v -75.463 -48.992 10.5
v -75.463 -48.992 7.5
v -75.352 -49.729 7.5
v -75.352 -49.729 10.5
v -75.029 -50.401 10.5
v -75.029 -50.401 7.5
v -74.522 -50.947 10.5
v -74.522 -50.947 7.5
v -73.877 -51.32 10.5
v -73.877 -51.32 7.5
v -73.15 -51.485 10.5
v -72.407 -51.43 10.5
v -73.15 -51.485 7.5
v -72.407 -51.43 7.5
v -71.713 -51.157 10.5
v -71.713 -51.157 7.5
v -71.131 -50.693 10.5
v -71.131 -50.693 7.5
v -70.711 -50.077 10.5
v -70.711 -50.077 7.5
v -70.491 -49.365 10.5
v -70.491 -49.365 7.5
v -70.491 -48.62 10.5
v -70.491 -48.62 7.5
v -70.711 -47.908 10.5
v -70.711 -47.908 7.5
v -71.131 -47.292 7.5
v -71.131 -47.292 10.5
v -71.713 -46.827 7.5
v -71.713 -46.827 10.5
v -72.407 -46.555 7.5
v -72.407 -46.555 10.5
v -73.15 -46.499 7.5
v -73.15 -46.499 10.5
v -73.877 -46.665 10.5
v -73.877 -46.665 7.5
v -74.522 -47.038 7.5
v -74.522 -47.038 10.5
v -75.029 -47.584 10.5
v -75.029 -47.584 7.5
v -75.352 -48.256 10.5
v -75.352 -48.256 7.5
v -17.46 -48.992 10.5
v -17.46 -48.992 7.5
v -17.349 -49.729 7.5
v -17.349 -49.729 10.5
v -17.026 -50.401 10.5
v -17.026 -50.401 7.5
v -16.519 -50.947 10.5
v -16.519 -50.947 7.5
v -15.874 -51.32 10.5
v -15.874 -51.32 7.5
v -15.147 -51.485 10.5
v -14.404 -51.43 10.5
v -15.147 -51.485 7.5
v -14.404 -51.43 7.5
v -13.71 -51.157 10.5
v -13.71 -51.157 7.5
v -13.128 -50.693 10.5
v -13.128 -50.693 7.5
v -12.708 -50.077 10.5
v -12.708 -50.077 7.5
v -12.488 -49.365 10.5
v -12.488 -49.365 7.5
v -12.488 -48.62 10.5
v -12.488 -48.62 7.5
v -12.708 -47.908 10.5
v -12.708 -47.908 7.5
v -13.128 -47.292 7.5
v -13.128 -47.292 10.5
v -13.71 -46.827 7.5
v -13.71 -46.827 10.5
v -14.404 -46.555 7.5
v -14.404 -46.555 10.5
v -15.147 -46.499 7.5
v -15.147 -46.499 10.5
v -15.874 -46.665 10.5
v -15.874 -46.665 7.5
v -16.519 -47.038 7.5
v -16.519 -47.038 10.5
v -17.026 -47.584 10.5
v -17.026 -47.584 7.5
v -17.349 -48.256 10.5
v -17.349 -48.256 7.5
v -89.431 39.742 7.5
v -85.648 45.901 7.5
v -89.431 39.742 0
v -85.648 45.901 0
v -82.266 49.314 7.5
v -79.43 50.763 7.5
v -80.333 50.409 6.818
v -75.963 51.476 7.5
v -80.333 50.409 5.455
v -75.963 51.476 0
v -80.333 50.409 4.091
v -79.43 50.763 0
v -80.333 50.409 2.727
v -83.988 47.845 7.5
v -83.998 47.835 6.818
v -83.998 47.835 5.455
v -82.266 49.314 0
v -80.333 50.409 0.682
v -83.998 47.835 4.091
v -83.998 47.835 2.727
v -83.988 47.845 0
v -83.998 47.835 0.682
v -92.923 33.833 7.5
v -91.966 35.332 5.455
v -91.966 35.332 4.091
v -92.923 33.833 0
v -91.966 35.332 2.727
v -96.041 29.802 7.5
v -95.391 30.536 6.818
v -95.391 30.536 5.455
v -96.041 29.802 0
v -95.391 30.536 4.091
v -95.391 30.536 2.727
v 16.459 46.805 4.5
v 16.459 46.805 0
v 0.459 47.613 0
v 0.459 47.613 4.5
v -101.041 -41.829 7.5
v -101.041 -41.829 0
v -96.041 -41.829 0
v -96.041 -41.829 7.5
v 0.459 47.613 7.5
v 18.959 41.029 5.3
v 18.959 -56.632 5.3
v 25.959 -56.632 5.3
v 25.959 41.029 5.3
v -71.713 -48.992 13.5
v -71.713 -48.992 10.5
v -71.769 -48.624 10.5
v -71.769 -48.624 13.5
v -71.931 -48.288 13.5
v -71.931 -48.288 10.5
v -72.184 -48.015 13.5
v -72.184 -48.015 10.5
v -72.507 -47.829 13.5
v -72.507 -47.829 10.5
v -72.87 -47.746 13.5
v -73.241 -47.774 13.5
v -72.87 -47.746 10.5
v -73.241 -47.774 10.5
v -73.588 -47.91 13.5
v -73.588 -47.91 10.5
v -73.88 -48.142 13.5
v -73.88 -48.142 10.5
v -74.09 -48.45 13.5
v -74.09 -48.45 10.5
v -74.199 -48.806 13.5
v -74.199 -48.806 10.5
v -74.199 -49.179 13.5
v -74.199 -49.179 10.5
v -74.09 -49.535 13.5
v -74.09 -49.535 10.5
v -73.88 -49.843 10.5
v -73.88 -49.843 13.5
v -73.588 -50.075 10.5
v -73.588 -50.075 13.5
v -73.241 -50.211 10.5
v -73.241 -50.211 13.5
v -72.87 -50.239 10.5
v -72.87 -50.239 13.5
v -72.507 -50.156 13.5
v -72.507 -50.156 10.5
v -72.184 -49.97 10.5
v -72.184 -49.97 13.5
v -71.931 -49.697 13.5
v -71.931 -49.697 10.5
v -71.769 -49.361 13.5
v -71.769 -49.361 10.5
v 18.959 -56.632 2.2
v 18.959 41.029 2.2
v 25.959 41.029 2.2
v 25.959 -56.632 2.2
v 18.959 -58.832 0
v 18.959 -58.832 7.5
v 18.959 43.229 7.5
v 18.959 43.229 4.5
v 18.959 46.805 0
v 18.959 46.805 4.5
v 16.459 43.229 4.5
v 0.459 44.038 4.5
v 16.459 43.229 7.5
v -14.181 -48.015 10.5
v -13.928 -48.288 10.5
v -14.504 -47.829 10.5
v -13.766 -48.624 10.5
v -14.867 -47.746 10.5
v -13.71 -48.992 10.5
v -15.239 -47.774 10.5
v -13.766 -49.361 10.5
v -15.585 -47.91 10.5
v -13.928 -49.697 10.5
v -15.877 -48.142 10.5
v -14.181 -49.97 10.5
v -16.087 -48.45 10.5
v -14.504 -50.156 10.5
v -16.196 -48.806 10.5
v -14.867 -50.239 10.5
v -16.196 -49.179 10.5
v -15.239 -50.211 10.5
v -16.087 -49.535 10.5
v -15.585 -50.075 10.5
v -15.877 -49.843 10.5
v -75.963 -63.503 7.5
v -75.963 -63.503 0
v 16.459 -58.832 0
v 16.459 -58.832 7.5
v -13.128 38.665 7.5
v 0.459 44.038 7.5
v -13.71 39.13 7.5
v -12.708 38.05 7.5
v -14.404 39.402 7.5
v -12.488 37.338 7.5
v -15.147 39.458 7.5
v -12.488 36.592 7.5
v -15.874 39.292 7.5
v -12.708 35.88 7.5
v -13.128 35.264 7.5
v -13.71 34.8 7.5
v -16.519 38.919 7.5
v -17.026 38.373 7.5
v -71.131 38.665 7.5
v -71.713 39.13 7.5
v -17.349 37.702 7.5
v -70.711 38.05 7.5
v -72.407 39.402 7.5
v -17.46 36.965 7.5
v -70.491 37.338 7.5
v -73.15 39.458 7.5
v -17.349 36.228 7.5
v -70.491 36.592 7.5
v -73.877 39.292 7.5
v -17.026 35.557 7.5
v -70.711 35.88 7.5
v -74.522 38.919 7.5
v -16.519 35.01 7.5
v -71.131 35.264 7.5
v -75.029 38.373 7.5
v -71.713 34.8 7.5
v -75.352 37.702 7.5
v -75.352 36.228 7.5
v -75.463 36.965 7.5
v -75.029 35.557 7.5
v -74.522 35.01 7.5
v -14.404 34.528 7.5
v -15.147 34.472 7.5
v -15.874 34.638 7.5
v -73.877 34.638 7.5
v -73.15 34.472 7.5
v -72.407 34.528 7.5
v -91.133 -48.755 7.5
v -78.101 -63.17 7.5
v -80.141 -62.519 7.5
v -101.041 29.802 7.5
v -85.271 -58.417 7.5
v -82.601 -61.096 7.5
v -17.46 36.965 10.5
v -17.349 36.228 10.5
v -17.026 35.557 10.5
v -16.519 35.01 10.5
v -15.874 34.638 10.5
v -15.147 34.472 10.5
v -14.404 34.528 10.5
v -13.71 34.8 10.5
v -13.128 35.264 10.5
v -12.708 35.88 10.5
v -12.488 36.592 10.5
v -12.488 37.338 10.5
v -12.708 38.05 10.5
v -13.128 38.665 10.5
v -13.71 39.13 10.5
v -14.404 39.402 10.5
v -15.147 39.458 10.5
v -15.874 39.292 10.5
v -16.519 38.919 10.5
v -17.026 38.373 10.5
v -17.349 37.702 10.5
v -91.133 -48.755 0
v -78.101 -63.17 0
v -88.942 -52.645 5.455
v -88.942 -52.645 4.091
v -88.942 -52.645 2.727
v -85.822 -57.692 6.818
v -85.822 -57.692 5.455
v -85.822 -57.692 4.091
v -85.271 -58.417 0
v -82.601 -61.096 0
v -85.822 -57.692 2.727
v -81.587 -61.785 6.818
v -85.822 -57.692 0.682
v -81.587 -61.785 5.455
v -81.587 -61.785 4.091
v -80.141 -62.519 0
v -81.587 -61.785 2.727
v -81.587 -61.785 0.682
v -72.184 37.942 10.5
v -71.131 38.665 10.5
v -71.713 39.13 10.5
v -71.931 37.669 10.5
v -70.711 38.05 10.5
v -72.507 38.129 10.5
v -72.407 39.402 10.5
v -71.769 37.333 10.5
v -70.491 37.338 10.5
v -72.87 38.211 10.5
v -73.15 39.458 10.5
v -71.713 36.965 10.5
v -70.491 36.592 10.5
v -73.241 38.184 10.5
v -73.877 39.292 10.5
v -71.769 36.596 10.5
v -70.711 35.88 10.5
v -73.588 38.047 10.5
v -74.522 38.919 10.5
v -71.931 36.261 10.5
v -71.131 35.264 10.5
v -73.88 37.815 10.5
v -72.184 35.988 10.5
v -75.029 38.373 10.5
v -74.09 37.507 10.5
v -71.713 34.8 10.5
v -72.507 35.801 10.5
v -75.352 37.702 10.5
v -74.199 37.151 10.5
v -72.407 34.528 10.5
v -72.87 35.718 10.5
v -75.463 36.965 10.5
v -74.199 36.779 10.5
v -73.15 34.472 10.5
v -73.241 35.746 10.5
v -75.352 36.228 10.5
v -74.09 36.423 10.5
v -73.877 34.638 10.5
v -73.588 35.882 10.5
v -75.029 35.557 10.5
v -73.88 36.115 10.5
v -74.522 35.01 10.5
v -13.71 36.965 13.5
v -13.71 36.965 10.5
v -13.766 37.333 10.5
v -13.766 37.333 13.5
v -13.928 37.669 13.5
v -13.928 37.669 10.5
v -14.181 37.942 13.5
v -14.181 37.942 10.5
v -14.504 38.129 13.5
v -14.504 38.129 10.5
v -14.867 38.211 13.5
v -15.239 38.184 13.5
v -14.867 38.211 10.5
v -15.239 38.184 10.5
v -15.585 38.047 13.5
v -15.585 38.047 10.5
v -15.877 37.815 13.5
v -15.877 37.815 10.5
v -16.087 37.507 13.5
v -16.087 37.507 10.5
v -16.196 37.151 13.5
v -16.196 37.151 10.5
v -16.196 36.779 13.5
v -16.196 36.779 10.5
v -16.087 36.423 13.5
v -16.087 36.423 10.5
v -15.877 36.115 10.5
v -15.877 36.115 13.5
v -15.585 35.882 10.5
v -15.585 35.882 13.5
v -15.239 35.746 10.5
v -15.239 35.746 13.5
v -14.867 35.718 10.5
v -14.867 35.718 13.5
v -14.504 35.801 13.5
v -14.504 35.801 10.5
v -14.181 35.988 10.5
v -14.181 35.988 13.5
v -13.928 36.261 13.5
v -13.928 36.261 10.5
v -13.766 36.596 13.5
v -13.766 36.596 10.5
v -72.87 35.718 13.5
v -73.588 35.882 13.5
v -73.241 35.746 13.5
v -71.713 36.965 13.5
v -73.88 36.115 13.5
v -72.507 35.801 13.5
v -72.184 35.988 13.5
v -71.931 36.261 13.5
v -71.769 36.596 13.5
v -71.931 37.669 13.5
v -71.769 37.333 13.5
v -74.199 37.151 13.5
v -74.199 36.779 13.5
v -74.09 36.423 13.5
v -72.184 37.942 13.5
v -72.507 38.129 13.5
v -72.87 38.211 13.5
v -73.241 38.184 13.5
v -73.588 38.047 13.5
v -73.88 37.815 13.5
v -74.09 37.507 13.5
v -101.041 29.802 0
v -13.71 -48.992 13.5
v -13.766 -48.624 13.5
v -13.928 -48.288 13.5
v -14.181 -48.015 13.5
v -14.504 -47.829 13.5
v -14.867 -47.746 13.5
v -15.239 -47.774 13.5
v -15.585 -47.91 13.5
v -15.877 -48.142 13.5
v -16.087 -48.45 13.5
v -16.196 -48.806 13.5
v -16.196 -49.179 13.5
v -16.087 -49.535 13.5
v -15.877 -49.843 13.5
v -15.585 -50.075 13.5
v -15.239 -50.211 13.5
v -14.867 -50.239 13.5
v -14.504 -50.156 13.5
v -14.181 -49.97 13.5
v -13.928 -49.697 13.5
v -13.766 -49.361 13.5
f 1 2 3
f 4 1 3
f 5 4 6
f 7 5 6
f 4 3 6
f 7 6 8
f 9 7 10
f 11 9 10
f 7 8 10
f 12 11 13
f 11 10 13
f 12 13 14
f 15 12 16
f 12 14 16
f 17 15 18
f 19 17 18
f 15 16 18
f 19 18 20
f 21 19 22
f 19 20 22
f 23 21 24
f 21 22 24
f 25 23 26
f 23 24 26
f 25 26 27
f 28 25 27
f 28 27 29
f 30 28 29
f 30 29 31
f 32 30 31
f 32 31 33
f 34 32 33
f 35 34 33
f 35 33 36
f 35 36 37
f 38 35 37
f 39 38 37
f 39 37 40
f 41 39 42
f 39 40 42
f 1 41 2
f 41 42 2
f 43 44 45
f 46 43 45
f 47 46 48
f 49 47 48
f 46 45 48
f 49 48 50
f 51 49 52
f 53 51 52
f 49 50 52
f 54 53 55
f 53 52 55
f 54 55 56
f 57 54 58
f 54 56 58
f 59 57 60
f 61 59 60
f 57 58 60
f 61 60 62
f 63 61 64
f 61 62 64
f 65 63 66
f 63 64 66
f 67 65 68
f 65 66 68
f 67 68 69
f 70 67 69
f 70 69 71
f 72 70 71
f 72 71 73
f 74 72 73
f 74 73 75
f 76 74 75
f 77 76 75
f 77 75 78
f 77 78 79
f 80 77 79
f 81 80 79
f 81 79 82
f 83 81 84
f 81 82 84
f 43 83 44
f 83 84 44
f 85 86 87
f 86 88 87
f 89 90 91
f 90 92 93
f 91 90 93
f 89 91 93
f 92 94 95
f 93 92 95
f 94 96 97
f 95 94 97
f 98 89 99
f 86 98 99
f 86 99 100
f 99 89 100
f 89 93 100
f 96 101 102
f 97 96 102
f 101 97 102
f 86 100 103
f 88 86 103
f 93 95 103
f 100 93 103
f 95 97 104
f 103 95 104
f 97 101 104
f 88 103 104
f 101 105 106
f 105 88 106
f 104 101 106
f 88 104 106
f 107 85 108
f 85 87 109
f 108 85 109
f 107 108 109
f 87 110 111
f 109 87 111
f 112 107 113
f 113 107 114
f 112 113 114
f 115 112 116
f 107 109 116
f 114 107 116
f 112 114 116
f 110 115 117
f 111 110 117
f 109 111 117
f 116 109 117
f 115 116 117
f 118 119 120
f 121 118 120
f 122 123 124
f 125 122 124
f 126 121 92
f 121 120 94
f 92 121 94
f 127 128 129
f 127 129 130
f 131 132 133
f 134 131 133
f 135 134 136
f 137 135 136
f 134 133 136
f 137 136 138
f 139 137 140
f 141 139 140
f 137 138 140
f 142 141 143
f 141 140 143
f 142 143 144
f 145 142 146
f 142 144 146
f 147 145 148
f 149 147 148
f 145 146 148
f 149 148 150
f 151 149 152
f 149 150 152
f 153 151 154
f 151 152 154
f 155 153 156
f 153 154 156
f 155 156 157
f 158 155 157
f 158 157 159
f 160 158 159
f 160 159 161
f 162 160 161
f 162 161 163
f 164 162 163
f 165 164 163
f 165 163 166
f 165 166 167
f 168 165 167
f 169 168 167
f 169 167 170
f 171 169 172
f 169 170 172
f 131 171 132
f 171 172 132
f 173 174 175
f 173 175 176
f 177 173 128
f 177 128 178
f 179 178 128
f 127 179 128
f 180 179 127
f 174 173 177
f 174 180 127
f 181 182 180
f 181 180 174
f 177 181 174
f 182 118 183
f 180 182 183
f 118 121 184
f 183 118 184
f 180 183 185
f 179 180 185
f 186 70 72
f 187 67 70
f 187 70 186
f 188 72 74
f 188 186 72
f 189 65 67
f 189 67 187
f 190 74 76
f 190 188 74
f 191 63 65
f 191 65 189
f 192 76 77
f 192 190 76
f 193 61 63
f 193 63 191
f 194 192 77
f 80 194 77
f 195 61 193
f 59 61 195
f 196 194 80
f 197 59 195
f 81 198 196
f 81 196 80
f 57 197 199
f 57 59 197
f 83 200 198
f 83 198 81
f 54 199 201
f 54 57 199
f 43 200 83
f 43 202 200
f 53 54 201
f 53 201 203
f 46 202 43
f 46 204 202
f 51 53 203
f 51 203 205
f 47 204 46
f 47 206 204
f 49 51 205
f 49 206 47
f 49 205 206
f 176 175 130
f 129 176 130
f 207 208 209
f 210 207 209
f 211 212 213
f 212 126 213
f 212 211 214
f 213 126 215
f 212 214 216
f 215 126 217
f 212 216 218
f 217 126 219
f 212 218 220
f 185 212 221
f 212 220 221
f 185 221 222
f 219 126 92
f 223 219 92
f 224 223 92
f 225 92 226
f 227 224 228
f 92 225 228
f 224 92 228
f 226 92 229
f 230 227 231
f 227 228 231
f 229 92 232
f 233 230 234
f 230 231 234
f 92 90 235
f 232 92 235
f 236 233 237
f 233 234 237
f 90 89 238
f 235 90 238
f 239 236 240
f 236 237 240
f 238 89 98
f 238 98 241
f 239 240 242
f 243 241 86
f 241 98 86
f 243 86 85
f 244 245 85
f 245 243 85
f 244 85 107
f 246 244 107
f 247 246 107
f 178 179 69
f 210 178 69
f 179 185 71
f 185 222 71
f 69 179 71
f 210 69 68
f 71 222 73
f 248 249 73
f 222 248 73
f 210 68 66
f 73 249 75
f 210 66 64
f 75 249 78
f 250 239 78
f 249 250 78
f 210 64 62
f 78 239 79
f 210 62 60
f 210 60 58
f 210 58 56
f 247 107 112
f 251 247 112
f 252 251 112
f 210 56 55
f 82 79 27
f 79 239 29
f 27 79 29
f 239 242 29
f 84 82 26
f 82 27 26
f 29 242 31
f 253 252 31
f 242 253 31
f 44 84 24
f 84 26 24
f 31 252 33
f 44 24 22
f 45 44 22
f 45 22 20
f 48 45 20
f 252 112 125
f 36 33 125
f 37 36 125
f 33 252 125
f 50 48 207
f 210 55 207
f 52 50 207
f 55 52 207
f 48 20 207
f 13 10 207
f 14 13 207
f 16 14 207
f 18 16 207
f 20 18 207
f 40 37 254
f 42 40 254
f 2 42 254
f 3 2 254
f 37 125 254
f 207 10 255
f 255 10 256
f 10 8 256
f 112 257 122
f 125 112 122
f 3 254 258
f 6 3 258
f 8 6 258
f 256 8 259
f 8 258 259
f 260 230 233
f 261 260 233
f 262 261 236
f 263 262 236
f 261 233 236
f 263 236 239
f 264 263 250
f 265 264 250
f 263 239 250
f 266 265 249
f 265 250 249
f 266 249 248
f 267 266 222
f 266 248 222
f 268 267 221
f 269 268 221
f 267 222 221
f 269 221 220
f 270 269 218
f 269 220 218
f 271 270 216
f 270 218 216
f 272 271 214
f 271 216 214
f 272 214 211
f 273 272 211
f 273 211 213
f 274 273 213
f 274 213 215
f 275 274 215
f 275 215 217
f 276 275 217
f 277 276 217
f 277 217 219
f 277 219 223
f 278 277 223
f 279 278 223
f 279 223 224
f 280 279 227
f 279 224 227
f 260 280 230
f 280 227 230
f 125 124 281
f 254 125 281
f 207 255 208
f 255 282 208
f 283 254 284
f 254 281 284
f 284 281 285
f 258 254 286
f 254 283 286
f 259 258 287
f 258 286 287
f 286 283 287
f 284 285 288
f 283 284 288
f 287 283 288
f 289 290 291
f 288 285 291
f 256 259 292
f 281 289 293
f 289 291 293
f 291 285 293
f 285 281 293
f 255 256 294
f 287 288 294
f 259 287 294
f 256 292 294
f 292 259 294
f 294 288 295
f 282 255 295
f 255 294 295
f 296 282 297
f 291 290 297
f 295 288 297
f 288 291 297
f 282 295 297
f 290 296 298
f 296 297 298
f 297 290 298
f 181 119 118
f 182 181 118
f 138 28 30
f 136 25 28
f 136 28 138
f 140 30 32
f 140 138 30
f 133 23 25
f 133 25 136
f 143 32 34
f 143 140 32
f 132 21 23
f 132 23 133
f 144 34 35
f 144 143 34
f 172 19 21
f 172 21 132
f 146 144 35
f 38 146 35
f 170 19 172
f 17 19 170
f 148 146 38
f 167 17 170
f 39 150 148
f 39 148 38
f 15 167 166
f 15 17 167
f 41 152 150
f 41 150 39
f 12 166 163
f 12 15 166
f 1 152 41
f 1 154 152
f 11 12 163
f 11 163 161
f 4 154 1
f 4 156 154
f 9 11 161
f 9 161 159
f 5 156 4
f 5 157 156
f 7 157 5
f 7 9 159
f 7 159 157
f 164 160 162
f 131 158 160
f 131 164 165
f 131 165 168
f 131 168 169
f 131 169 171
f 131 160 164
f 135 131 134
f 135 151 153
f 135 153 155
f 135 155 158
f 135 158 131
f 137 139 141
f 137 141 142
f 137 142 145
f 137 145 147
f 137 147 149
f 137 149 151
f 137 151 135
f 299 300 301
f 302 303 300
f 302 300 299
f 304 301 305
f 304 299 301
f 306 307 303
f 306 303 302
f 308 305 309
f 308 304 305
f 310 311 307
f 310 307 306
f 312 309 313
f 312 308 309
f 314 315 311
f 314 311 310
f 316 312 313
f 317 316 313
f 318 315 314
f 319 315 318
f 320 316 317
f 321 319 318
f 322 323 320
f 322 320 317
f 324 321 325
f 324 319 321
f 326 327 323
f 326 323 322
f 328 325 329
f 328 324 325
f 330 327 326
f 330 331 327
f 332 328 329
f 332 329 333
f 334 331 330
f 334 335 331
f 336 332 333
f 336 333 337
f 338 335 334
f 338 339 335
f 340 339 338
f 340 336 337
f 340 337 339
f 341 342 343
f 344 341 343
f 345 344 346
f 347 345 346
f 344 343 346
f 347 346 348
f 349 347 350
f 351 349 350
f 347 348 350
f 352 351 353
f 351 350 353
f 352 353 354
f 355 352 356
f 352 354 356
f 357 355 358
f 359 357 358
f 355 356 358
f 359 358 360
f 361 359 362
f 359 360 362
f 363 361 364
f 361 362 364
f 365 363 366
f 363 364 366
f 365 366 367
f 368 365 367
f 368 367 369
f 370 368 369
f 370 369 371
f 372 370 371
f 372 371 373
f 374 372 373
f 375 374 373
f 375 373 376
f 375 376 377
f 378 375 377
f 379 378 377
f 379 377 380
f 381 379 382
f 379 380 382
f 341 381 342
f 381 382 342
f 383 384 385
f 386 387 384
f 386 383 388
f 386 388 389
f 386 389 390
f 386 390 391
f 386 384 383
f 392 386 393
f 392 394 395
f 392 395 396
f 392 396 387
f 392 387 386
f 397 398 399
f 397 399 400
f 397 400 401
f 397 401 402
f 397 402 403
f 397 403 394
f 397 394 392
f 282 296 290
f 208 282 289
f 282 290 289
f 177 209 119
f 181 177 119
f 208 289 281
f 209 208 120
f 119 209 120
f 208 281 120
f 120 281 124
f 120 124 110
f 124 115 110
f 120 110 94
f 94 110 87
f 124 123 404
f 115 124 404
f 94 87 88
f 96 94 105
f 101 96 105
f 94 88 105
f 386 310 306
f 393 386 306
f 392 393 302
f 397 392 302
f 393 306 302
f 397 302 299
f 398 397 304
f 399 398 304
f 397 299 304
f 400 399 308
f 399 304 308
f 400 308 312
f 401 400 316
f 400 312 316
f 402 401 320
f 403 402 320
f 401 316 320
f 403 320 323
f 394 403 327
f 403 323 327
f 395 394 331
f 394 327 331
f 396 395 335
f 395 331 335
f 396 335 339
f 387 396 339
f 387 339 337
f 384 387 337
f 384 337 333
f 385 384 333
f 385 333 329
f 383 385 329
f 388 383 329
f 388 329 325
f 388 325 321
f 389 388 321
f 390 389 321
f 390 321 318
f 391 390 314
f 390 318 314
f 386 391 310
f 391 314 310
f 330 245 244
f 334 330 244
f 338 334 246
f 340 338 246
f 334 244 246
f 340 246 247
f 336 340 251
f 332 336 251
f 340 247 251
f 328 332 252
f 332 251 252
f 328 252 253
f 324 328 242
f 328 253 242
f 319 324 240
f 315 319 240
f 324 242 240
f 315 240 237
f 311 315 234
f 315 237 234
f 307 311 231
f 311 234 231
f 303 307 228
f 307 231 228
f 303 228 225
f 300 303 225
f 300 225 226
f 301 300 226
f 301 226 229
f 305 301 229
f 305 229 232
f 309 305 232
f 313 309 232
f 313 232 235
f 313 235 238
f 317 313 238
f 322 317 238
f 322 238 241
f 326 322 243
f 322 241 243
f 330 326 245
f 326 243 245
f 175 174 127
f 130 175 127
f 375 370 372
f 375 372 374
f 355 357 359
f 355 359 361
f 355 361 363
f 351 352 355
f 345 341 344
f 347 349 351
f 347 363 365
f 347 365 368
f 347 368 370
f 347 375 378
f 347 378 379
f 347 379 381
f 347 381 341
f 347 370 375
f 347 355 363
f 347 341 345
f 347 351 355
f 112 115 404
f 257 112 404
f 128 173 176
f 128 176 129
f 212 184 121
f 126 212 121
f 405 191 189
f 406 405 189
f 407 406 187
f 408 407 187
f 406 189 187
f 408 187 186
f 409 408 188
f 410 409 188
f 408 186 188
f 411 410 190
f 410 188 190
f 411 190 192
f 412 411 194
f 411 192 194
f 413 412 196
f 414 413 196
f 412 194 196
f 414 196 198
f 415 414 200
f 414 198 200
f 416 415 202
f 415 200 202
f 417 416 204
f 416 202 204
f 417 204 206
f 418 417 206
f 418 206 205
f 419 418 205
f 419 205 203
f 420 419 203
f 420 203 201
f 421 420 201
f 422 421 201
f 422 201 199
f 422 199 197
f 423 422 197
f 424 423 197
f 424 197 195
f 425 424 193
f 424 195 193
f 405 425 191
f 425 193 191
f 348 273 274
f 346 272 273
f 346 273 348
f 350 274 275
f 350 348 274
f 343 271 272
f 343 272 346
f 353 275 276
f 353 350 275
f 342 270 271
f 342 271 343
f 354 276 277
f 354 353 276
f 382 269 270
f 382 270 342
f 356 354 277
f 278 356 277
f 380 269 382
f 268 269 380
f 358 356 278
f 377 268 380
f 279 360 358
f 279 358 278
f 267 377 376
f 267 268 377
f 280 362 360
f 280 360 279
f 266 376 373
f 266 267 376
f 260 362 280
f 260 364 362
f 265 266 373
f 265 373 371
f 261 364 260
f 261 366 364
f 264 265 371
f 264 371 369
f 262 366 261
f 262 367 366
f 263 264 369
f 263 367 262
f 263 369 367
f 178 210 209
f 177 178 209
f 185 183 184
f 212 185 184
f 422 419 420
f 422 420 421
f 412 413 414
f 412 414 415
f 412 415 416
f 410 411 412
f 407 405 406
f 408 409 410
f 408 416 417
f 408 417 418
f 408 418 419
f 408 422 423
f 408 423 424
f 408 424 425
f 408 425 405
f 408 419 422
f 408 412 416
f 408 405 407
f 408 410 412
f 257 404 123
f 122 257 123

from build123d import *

# Parameters (mm, degrees)
STOCK_BATTERY_BASE_1_DEPTH   = 7.5
STOCK_BATTERY_BASE_1_2_DEPTH = 4.5
BOSS_EXTRUDE1_DEPTH          = 2.5
BOSS_EXTRUDE2_DEPTH          = 7
SKETCH3_R                    = 2.5
BOSS_EXTRUDE4_DEPTH          = 3
SKETCH4_R                    = 1.25
BOSS_EXTRUDE5_DEPTH          = 3


# Read off the part's stored shape, not the designer's step: Stock-battery base-1
with BuildPart() as part:
    # Stock-battery base-1 outline → Stock-battery base-1 (new body)
    with BuildSketch(Plane.XY):
        with BuildLine():
            Line((16.459100066, -58.832087736), (16.459100066, 43.22938712))
            Line((16.459100066, 43.22938712), (0.459100066, 44.038083245))
            Line((0.459100066, 44.038083245), (0.459100066, 47.61329436))
            Line((0.459100066, 47.61329436), (-75.963345356, 51.475952827))
            add(Edge.make_bspline(
                [(-75.963345356, 51.475952827), (-76.969760945, 51.385311169), (-77.956664013, 51.213742336), (-79.395866789, 50.78571401), (-79.86970863, 50.613871194), (-80.796837185, 50.204577199), (-81.240590365, 49.971323111), (-82.089787414, 49.449496549), (-82.495246976, 49.160946736), (-83.271465049, 48.533739024), (-83.643007435, 48.194375714), (-84.708444042, 47.116795042), (-85.333215001, 46.343374139), (-86.491296884, 44.737676097), (-87.023827607, 43.904896882), (-88.044872363, 42.211012893), (-88.533034054, 41.34968138), (-89.982900727, 38.756279626), (-90.93240726, 37.013628654), (-92.999467157, 33.650383947), (-94.114586107, 32.031232641), (-95.60337212, 30.287705281), (-95.819744565, 30.042891916), (-96.040899934, 29.801740739)],
                knots=[0, 0, 0, 0, 0.0625, 0.0625, 0.09375, 0.09375, 0.125, 0.125, 0.15625, 0.15625, 0.1875, 0.1875, 0.25, 0.25, 0.3125, 0.3125, 0.375, 0.375, 0.5, 0.5, 0.625, 0.625, 0.645748558, 0.645748558, 0.645748558, 0.645748558], degree=3))
            Line((-96.040899934, 29.801740739), (-101.040899934, 29.801740739))
            Line((-101.040899934, 29.801740739), (-101.040899934, -41.829259963))
            Line((-101.040899934, -41.829259963), (-96.040899934, -41.829259963))
            add(Edge.make_bspline(
                [(-96.040899934, -41.829259963), (-95.798899268, -42.093160096), (-95.56197213, -42.362136183), (-94.03954966, -44.156758027), (-92.923608678, -45.792412437), (-90.858487716, -49.170948695), (-89.911065512, -50.914960796), (-88.457766632, -53.51029646), (-87.967520262, -54.371999904), (-86.940892781, -56.06392928), (-86.404912323, -56.894254814), (-85.530671439, -58.091259413), (-85.227414802, -58.482089731), (-84.588818098, -59.241614046), (-84.254184704, -59.609132259), (-83.204929916, -60.651600397), (-82.440569541, -61.270576891), (-81.160629249, -62.042718444), (-80.719255742, -62.269433113), (-79.817314106, -62.660888928), (-79.3554021, -62.826549047), (-77.940467092, -63.243286827), (-76.954208328, -63.414201398), (-75.963345356, -63.503442328)],
                knots=[0.352672192, 0.352672192, 0.352672192, 0.352672192, 0.375, 0.375, 0.5, 0.5, 0.625, 0.625, 0.6875, 0.6875, 0.75, 0.75, 0.78125, 0.78125, 0.8125, 0.8125, 0.875, 0.875, 0.90625, 0.90625, 0.9375, 0.9375, 1, 1, 1, 1], degree=3))
            Line((-75.963345356, -63.503442328), (16.459100066, -58.832087736))
        make_face()
    extrude(amount=STOCK_BATTERY_BASE_1_DEPTH)

    # Stock-battery base-1 2 outline → Stock-battery base-1 2 (add)
    with BuildSketch(Plane.XY):
        Polygon((16.459100066, 43.22938712), (16.459100066, 46.804598235), (0.459100066, 47.61329436), (0.459100066, 44.038083245), align=None)
    extrude(amount=STOCK_BATTERY_BASE_1_2_DEPTH)

    # Sketch1 → Boss-Extrude1 (add)
    with BuildSketch(Plane(origin=(16.459100066, 0, 0), x_dir=(0, 0, -1), z_dir=(1, 0, 0))):
        Polygon((0, -58.832087736), (0, 46.804598235), (-4.5, 46.804598235), (-4.5, 43.22938712), (-7.5, 43.22938712), (-7.5, -58.832087736), align=None)
    extrude(amount=BOSS_EXTRUDE1_DEPTH)

    # Sketch2 → Boss-Extrude2 (add)
    with BuildSketch(Plane(origin=(18.959100066, 0, 0), x_dir=(0, 0, -1), z_dir=(1, 0, 0))):
        Polygon((-2.3, 41.02938712), (-2.2, 41.02938712), (-2.2, -56.632087736), (-5.3, -56.632087736), (-5.3, 41.02938712), align=None)
    extrude(amount=BOSS_EXTRUDE2_DEPTH)

    # Sketch3 → Boss-Extrude4 (add)
    with BuildSketch(Plane.XY.offset(7.5)):
        with Locations(Location((-72.963345356, 36.964917072, 0), (0, 0, 180))):
            Circle(SKETCH3_R)
        with Locations(Location((-14.960454045, 36.964917072, 0), (0, 0, 180))):
            Circle(SKETCH3_R)
        with Locations(Location((-14.960454045, -48.992436296, 0), (0, 0, 180))):
            Circle(SKETCH3_R)
        with Locations(Location((-72.963345356, -48.992436296, 0), (0, 0, 180))):
            Circle(SKETCH3_R)
    extrude(amount=BOSS_EXTRUDE4_DEPTH)

    # Sketch4 → Boss-Extrude5 (add)
    with BuildSketch(Plane.XY.offset(10.5)):
        with Locations((-72.963345356, 36.964917072)):
            Circle(SKETCH4_R)
        with Locations((-14.960454045, 36.964917072)):
            Circle(SKETCH4_R)
        with Locations((-72.963345356, -48.992436296)):
            Circle(SKETCH4_R)
        with Locations((-14.960454045, -48.992436296)):
            Circle(SKETCH4_R)
    extrude(amount=BOSS_EXTRUDE5_DEPTH)


solid = part.part
